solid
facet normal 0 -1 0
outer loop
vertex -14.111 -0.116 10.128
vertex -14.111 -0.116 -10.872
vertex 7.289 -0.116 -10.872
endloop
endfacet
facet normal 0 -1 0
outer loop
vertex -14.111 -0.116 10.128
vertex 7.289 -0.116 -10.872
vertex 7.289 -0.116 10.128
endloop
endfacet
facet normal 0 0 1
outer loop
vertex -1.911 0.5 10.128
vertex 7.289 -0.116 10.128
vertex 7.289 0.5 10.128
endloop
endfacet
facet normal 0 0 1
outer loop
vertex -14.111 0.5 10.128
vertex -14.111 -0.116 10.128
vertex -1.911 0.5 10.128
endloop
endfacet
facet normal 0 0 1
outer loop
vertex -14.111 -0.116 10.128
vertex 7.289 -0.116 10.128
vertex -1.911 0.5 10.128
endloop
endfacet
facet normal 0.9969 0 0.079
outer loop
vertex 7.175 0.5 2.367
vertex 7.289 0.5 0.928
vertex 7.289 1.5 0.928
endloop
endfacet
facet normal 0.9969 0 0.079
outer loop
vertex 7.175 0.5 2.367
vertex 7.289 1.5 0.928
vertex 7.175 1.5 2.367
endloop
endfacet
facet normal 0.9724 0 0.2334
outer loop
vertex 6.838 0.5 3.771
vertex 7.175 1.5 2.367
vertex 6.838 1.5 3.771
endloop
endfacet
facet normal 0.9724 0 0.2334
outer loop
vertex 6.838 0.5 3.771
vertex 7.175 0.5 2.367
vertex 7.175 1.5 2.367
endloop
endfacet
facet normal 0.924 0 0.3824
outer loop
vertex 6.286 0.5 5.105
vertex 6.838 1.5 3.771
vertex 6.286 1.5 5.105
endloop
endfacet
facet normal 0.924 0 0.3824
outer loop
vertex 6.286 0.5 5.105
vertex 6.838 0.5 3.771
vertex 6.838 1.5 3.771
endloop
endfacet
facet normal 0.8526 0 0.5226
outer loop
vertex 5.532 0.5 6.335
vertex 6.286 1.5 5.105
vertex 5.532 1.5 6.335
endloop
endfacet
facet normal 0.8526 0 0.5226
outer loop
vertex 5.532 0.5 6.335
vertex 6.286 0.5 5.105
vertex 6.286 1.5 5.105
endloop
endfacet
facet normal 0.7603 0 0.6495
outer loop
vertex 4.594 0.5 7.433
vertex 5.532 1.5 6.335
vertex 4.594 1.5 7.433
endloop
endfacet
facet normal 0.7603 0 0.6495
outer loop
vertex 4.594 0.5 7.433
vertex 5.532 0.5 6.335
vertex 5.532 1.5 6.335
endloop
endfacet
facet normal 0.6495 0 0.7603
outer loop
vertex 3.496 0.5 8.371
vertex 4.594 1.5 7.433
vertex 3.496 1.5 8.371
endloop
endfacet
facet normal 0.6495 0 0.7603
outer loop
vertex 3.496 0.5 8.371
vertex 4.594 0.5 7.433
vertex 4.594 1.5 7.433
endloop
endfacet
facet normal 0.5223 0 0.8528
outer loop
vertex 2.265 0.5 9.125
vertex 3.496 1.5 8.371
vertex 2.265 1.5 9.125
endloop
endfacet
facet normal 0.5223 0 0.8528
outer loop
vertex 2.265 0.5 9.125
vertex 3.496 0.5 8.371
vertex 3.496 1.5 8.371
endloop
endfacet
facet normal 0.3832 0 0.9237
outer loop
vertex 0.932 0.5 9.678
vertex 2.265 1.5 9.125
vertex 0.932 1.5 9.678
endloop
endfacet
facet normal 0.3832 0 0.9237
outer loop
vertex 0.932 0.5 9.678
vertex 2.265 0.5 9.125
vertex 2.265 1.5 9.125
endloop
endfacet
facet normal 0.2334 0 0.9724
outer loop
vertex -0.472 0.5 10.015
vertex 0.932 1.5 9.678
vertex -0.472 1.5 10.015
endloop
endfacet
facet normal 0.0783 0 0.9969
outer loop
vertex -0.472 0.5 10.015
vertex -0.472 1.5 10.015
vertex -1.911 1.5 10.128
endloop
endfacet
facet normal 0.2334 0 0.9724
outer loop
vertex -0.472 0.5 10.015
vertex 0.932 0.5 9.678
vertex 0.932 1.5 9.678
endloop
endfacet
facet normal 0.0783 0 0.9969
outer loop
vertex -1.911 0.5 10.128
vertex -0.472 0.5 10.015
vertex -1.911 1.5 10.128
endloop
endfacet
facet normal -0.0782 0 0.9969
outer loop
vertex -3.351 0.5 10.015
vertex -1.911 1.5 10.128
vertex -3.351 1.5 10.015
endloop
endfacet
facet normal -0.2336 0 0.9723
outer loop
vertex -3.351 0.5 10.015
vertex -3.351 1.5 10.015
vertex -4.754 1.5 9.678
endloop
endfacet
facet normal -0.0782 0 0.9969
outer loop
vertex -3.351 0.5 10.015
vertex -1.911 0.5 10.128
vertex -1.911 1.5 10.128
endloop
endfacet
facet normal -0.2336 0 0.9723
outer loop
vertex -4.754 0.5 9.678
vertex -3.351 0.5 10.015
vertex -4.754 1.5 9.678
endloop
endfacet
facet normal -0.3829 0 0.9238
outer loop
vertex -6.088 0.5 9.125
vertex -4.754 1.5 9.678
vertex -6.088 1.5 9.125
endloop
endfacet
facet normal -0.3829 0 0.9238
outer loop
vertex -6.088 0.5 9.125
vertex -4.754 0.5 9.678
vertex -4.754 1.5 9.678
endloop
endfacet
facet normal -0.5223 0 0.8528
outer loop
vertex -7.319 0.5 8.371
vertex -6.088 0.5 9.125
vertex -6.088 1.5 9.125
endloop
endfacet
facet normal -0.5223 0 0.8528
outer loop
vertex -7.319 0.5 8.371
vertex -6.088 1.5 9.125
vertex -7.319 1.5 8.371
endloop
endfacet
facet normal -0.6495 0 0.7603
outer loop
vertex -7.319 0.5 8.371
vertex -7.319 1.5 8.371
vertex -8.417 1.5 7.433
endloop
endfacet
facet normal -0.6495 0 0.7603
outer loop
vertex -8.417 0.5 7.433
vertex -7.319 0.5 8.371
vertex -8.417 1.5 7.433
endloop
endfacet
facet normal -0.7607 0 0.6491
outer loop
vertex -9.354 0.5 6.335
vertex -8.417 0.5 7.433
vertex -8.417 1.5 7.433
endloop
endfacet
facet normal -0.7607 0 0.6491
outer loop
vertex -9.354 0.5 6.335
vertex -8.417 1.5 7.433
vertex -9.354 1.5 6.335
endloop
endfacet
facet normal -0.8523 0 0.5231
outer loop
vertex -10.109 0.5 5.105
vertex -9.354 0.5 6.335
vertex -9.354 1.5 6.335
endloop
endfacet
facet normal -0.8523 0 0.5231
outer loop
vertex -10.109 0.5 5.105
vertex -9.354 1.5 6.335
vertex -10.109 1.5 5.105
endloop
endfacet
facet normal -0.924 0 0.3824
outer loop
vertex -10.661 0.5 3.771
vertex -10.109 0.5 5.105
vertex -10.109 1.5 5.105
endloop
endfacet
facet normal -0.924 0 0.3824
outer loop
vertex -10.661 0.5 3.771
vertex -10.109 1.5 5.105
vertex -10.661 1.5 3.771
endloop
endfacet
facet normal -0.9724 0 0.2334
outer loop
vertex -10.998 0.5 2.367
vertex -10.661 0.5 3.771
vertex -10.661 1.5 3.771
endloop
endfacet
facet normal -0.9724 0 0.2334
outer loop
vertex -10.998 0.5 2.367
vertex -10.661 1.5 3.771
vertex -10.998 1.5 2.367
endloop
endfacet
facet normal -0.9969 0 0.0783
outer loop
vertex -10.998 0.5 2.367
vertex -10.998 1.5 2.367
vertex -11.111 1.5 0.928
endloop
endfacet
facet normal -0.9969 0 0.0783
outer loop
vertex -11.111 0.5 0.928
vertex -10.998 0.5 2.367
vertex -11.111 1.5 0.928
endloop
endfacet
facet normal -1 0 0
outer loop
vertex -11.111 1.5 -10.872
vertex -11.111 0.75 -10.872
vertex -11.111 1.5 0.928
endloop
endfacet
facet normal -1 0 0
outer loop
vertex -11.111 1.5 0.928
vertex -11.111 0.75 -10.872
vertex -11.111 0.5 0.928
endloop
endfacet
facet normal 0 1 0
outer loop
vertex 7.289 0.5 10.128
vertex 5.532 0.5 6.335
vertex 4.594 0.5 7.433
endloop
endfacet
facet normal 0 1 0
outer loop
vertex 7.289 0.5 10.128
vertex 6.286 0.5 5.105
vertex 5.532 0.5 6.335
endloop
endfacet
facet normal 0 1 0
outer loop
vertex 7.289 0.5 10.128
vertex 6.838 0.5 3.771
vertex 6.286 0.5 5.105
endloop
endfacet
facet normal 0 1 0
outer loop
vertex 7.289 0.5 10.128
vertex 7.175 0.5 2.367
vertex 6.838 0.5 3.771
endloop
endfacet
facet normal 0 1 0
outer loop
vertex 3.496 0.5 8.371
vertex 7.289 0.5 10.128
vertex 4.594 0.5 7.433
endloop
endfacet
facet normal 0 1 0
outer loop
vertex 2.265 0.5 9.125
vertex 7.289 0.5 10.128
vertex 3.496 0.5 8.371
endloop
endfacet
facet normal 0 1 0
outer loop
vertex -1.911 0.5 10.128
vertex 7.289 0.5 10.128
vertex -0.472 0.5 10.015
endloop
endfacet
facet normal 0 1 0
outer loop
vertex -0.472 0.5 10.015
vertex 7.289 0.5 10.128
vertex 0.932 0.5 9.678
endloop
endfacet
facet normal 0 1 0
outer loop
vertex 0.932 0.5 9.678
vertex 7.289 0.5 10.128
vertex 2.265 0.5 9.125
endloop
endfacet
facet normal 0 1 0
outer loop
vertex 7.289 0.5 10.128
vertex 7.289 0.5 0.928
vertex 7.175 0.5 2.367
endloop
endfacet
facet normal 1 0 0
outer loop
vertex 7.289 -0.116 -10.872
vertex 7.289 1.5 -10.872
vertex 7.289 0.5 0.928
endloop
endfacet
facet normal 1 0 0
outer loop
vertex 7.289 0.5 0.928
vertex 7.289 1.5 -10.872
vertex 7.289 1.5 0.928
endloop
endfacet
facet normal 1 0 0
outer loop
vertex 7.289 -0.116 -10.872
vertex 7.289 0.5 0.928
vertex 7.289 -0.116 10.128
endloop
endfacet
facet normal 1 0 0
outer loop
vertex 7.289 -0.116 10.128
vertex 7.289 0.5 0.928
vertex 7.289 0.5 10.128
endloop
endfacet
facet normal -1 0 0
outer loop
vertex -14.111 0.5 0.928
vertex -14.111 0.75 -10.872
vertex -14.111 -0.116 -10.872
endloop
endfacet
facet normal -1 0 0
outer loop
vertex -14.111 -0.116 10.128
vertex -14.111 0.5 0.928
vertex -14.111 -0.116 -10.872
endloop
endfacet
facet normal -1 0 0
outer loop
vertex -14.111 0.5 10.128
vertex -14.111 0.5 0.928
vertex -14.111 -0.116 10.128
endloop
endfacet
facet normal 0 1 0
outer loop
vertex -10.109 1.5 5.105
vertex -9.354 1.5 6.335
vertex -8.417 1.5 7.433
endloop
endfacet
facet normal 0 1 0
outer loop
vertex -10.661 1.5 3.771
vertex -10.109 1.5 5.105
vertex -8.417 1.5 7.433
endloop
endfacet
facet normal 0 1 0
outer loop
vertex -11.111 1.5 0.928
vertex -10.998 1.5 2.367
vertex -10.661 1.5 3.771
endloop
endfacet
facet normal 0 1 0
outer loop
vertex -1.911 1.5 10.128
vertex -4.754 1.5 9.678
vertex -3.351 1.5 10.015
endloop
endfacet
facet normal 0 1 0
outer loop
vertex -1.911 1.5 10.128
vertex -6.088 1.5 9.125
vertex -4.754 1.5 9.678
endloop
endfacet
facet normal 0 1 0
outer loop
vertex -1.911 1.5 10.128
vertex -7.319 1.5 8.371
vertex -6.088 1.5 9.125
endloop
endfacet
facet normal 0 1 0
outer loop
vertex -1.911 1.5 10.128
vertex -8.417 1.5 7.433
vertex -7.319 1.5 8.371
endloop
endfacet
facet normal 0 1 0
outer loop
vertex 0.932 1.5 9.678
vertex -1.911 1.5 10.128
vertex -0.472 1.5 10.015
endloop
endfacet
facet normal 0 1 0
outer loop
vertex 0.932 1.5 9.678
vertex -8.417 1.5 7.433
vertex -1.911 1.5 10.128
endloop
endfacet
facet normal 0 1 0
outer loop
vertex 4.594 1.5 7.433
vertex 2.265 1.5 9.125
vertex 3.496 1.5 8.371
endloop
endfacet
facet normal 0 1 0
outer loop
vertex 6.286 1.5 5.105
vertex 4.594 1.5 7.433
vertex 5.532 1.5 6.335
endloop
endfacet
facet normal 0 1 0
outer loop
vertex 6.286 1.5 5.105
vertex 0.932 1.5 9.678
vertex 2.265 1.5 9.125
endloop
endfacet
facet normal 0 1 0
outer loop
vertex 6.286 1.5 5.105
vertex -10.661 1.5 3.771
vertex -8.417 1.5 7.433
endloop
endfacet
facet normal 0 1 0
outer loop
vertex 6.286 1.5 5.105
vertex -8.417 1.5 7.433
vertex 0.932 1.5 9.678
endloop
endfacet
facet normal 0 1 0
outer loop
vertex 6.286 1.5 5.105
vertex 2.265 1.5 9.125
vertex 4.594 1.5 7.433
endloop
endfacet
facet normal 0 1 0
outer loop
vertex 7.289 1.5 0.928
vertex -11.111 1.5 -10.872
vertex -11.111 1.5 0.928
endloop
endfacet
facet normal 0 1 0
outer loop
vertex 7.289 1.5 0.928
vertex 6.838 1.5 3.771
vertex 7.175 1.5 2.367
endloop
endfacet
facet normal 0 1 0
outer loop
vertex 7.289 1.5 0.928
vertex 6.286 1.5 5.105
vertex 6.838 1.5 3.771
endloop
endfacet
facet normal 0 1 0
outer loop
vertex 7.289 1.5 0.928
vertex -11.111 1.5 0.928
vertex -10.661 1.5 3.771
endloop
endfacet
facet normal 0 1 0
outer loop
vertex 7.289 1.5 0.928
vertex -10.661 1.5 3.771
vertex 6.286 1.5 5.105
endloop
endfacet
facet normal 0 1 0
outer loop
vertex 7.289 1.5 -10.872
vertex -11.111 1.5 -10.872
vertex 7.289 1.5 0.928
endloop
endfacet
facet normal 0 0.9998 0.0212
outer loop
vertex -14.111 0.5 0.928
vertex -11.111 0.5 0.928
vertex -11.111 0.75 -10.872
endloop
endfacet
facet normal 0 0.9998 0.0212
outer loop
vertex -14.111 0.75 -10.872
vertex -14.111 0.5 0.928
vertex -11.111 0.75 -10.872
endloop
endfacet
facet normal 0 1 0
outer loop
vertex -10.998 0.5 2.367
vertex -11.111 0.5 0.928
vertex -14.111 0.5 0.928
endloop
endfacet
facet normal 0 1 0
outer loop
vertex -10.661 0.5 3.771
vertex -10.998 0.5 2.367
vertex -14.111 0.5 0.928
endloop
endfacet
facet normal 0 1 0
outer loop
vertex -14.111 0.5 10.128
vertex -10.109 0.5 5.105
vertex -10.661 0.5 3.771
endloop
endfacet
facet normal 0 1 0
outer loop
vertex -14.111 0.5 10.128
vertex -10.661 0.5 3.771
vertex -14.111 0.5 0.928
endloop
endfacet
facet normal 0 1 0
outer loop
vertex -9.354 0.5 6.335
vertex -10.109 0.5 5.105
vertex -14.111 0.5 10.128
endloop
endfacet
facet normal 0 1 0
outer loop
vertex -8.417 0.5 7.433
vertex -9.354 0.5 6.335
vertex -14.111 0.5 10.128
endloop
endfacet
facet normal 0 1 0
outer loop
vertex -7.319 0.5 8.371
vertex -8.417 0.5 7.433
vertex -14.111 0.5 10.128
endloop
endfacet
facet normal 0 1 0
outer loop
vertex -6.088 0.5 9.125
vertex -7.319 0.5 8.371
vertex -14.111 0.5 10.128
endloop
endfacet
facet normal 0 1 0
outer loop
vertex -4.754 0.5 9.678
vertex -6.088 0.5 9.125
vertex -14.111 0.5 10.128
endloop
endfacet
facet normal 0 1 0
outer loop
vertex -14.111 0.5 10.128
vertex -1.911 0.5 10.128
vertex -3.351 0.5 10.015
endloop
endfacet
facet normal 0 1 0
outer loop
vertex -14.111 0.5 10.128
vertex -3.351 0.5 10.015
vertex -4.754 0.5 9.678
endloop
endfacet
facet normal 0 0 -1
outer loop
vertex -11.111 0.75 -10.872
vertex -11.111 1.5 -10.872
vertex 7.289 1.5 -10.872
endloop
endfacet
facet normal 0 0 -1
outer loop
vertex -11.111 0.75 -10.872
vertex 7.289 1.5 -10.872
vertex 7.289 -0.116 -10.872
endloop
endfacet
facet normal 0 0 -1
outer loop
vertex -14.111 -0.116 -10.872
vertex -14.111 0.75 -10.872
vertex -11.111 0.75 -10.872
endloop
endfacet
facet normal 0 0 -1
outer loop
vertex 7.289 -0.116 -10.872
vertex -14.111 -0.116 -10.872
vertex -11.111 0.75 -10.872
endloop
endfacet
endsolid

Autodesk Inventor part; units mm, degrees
ref_plane "YZ Plane" through (0, 0, 0) normal (1, 0, 0) x (0, 1, 0)
ref_plane "XZ Plane" through (0, 0, 0) normal (0, 1, 0) x (-1, 0, 0)
ref_plane "XY Plane" through (0, 0, 0) normal (0, 0, 1) x (1, 0, 0)
sketch "Sketch1" plane through (0, 0, 0) normal (0, 0, 1) x (1, 0, 0)
  point P0 (0, 0)
sketch "Sketch2" plane through (0, 0, 0) normal (0, 1, 0) x (-1, 0, 0)
  line L0 (11.1114, 10.1278) -> (-7.2886, 10.1278)
  line L1 (-7.2886, 10.1278) -> (-7.2886, -10.8722)
  line L2 (-7.2886, -10.8722) -> (11.1114, -10.8722)
  line L3 (11.1114, -10.8722) -> (11.1114, 10.1278)
  point P0 (0, 0)
  dimension "d0" = 21
  dimension "d1" = 18.4
extrude "Extrusion1" add sketch "Sketch2" along normal blind 0.5
sketch "Sketch3" plane through (0, 0.5, 0) normal (0, 1, 0) x (1, 0, 0)
  circle A0 centre (-1.9114, -0.9278) radius 9.2
  line L0 (-11.1114, -10.1278) -> (7.2886, -10.1278) projected
  line L1 (7.2886, -10.1278) -> (7.2886, 10.8722) projected
  line L2 (7.2886, -10.1278) -> (7.2886, 10.8722) projected
  line L3 (7.2886, 10.8722) -> (-11.1114, 10.8722) projected
  line L4 (-11.1114, 10.8722) -> (-11.1114, -10.1278) projected
  line L5 (-11.1114, -10.1278) -> (7.2886, -10.1278) projected
  point P0 (0, 0)
  point P1 (-11.1114, -0.9278)
  point P2 (7.2886, -0.9278)
  dimension "d4" = 18.4
extrude "Extrusion2" add sketch "Sketch3" along normal blind 1 contours A0 | A0 L4 L3 L1
sketch "Sketch6" plane through (-11.1114, 0, -10.8722) normal (-1, 0, 0) x (0, 0, 1)
  line L0 (0, 0) -> (21, 0) projected
  line L1 (21, 0) -> (21, 0.5) projected
  line L2 (11.8, 0.5) -> (21, 0.5) projected
  line L3 (11.8, 0.5) -> (11.8, 1.5) projected
  line L4 (0, 1.5) -> (11.8, 1.5) projected
  line L5 (0, 0) -> (0, 1.5) projected
  line L6 (11.8, 0.5) -> (0, 0.75)
  point P0 (10.8722, 0)
extrude "Extrusion4" add sketch "Sketch6" along normal blind 3 contours L5 L6 L2 L1 L0
sketch "Sketch7" plane through (-14.1114, 0, -10.8722) normal (-1, 0, 0) x (0, 0, 1)
  line L0 (0, 0) -> (0, 1.5) projected
  line L1 (0, 0.75) -> (0, -0.116)
  line L2 (0, -0.116) -> (21, -0.116)
  line L3 (0, 0) -> (21, 0) projected
  line L4 (21, -0.116) -> (21, 0)
  point P0 (10.8722, 0)
  dimension "d11" = 0.866
extrude "Extrusion5" add sketch "Sketch7" against normal up to surface (21.4 mm away)
properties part number "klapka"
